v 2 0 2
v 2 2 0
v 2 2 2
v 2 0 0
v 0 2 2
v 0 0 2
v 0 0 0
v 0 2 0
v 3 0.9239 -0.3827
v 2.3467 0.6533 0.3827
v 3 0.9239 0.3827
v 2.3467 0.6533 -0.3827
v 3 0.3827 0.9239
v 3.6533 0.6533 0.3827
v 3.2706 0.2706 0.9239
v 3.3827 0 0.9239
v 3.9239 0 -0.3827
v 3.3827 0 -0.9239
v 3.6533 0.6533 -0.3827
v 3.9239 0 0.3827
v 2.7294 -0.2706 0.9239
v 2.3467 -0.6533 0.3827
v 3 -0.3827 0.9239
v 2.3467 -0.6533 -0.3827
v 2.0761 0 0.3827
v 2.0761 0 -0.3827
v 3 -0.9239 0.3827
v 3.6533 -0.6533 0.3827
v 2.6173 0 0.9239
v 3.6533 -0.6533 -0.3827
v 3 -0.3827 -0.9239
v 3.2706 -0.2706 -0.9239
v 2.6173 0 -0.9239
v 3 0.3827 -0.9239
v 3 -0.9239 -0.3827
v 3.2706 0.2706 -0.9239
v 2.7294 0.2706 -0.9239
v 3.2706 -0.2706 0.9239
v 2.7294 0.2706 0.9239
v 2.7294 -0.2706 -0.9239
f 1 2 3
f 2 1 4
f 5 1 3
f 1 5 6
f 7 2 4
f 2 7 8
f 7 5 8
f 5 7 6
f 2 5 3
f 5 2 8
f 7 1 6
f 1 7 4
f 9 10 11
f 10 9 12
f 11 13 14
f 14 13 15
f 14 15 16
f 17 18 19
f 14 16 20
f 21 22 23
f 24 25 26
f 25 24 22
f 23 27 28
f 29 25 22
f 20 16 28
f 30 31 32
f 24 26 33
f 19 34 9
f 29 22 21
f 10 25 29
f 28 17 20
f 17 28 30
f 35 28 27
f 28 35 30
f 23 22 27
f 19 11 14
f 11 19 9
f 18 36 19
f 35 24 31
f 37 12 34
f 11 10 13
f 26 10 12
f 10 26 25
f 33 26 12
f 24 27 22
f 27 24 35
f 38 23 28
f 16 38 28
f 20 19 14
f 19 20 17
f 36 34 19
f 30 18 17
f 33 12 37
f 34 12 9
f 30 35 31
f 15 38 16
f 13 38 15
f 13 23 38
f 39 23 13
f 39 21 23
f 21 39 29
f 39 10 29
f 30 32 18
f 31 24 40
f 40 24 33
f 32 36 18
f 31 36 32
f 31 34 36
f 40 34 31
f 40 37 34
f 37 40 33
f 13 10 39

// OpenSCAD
// color does not change the geometry
color("red") cube(2);
color([0, 0, 1, 0.5]) translate([3, 0, 0]) sphere(1, $fn = 8);
